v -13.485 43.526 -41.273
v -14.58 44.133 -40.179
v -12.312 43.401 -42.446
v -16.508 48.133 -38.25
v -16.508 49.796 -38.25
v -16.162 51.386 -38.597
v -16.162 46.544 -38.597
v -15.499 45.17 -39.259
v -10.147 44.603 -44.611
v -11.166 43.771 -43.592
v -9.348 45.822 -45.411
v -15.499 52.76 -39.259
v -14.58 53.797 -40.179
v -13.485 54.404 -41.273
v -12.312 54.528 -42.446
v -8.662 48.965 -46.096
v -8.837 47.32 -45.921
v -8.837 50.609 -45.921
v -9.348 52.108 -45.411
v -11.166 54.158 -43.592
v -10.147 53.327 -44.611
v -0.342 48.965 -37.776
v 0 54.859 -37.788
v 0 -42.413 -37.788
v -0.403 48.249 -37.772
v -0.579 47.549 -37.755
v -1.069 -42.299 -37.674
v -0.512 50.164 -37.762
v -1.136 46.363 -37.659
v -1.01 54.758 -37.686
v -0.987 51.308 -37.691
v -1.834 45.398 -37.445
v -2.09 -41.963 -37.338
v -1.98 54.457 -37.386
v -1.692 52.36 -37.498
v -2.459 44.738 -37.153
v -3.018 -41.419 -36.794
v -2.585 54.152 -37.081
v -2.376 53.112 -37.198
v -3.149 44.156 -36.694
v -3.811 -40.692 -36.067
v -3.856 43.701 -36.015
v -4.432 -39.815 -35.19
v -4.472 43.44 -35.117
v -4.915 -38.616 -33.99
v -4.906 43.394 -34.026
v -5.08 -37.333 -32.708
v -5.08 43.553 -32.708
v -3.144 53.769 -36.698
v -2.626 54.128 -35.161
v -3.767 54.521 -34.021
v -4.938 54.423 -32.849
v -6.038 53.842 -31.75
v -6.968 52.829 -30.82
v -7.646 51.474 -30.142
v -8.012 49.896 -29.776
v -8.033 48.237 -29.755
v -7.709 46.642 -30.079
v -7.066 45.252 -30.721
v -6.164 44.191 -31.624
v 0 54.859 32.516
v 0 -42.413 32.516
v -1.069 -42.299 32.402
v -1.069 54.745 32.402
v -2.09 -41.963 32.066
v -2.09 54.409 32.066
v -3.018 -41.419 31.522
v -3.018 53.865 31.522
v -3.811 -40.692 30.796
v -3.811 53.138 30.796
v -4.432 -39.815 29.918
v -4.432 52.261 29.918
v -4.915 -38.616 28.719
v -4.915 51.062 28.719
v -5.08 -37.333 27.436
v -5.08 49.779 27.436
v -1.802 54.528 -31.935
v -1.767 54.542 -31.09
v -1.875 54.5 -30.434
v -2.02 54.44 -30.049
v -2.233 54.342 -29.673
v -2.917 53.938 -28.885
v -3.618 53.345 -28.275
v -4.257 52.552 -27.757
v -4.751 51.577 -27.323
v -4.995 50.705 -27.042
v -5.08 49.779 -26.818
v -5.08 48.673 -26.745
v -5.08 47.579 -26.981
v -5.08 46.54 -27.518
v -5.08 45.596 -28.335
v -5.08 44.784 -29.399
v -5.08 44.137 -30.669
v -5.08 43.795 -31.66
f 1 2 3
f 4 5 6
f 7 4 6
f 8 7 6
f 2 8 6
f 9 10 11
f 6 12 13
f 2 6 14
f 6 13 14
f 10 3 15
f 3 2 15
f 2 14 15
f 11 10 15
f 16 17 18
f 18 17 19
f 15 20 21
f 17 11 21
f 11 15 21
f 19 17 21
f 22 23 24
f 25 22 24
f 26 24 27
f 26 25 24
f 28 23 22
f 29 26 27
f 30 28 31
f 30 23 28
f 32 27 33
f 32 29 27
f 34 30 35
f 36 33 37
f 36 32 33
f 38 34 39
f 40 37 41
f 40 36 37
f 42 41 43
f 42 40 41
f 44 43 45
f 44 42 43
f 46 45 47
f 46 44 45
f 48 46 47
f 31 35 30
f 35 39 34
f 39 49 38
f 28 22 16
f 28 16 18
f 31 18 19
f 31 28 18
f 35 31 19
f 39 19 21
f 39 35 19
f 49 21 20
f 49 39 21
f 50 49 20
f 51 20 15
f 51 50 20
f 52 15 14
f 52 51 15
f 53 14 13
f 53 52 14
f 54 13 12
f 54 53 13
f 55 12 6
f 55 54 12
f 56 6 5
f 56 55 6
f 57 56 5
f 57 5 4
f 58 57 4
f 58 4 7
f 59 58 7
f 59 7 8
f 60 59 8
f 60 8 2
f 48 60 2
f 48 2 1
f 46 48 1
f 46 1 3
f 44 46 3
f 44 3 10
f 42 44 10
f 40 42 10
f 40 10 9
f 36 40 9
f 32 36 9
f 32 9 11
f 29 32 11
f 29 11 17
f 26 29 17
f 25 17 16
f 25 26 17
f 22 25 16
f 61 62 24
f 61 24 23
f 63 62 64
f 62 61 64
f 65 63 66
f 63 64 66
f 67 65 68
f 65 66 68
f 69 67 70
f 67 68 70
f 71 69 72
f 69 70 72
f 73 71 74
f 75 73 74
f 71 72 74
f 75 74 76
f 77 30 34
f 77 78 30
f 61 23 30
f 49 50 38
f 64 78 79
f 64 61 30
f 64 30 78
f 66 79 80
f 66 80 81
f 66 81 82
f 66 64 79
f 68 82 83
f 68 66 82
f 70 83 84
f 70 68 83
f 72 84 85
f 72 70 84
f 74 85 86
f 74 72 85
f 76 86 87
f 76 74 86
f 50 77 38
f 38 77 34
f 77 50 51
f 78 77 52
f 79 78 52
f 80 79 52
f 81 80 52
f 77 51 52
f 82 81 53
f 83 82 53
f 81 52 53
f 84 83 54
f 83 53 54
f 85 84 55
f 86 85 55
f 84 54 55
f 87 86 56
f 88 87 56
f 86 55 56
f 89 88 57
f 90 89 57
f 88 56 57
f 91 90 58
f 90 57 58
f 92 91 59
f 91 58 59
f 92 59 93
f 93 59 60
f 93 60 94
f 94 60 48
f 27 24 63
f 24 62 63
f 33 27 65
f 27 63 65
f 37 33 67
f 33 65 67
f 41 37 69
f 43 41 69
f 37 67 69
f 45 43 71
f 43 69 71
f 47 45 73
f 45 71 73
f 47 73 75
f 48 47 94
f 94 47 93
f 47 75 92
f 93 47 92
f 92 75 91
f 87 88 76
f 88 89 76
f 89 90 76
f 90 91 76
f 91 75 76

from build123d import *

# Parameters (mm, degrees)
F0_W     = 97.2719080746
F0_H     = 70.3038610518
F1_DEPTH = 5.08
F2_R     = 5.07999
F4_R     = 5.5791141454
F5_DEPTH = 12


# Not quite as in the source:
# - a fillet or chamfer is up to 0.001 mm smaller than in the source, because OpenCascade refuses the exact size


with BuildPart() as f1:
    # F0 (on Right) → F1 (new body)
    with BuildSketch(Plane.YZ):
        with Locations((6.223058328, -2.6357788593)):
            Rectangle(F0_W, F0_H)
    extrude(amount=-F1_DEPTH)

    # F2 (radius 5.08 in the source; OpenCascade refuses exactly that, so slightly less here)
    f2_edges = [f1.edges().sort_by_distance(p)[0] for p in [
        (-5.08, 6.223058, 32.516152),
        (-5.08, -42.412896, -2.635779),
        (-5.08, 6.223058, -37.787709),
        (-5.08, 54.859012, -2.635779),
    ]]
    fillet(f2_edges, radius=F2_R)

    # F4 (on line) → F5 (join)
    with BuildSketch(Plane(origin=(-18.8938546926, 0, -18.8938546926), x_dir=(0.7071067812, 0, -0.7071067812), z_dir=(0.7071067812, 0, 0.7071067812))):
        with Locations((20.8907071501, 48.9649102092)):
            Circle(F4_R)
    extrude(amount=-F5_DEPTH)

    # F5_face (on face) → F6 (join, up to the last surface of F1)
    with BuildSketch(Plane(origin=(-6.0444772331, 49.5744646738, -31.743232152), x_dir=(0.7071067812, 0, -0.7071067812), z_dir=(0.7071067812, 0, 0.7071067812))):
        with BuildLine():
            add(Edge.make_bspline(
                [(4.8341488182, 4.5530437353), (1.3639767837, 3.0711160289), (1.3639767837, 0.2045576915)],
                knots=[5.255697667, 5.255697667, 5.255697667, 6.2831853072, 6.2831853072, 6.2831853072], degree=2, weights=[1, 0.8709107479, 1]))
            ThreePointArc((4.8341488182, 4.5530437353), (-2.582040706, 1.1300096876), (1.3639767837, -6.021631741))
            Line((1.3639767837, -6.021631741), (1.3639767837, 0.2045576915))
        make_face()
    extrude(until=Until.LAST)


solid = f1.part
